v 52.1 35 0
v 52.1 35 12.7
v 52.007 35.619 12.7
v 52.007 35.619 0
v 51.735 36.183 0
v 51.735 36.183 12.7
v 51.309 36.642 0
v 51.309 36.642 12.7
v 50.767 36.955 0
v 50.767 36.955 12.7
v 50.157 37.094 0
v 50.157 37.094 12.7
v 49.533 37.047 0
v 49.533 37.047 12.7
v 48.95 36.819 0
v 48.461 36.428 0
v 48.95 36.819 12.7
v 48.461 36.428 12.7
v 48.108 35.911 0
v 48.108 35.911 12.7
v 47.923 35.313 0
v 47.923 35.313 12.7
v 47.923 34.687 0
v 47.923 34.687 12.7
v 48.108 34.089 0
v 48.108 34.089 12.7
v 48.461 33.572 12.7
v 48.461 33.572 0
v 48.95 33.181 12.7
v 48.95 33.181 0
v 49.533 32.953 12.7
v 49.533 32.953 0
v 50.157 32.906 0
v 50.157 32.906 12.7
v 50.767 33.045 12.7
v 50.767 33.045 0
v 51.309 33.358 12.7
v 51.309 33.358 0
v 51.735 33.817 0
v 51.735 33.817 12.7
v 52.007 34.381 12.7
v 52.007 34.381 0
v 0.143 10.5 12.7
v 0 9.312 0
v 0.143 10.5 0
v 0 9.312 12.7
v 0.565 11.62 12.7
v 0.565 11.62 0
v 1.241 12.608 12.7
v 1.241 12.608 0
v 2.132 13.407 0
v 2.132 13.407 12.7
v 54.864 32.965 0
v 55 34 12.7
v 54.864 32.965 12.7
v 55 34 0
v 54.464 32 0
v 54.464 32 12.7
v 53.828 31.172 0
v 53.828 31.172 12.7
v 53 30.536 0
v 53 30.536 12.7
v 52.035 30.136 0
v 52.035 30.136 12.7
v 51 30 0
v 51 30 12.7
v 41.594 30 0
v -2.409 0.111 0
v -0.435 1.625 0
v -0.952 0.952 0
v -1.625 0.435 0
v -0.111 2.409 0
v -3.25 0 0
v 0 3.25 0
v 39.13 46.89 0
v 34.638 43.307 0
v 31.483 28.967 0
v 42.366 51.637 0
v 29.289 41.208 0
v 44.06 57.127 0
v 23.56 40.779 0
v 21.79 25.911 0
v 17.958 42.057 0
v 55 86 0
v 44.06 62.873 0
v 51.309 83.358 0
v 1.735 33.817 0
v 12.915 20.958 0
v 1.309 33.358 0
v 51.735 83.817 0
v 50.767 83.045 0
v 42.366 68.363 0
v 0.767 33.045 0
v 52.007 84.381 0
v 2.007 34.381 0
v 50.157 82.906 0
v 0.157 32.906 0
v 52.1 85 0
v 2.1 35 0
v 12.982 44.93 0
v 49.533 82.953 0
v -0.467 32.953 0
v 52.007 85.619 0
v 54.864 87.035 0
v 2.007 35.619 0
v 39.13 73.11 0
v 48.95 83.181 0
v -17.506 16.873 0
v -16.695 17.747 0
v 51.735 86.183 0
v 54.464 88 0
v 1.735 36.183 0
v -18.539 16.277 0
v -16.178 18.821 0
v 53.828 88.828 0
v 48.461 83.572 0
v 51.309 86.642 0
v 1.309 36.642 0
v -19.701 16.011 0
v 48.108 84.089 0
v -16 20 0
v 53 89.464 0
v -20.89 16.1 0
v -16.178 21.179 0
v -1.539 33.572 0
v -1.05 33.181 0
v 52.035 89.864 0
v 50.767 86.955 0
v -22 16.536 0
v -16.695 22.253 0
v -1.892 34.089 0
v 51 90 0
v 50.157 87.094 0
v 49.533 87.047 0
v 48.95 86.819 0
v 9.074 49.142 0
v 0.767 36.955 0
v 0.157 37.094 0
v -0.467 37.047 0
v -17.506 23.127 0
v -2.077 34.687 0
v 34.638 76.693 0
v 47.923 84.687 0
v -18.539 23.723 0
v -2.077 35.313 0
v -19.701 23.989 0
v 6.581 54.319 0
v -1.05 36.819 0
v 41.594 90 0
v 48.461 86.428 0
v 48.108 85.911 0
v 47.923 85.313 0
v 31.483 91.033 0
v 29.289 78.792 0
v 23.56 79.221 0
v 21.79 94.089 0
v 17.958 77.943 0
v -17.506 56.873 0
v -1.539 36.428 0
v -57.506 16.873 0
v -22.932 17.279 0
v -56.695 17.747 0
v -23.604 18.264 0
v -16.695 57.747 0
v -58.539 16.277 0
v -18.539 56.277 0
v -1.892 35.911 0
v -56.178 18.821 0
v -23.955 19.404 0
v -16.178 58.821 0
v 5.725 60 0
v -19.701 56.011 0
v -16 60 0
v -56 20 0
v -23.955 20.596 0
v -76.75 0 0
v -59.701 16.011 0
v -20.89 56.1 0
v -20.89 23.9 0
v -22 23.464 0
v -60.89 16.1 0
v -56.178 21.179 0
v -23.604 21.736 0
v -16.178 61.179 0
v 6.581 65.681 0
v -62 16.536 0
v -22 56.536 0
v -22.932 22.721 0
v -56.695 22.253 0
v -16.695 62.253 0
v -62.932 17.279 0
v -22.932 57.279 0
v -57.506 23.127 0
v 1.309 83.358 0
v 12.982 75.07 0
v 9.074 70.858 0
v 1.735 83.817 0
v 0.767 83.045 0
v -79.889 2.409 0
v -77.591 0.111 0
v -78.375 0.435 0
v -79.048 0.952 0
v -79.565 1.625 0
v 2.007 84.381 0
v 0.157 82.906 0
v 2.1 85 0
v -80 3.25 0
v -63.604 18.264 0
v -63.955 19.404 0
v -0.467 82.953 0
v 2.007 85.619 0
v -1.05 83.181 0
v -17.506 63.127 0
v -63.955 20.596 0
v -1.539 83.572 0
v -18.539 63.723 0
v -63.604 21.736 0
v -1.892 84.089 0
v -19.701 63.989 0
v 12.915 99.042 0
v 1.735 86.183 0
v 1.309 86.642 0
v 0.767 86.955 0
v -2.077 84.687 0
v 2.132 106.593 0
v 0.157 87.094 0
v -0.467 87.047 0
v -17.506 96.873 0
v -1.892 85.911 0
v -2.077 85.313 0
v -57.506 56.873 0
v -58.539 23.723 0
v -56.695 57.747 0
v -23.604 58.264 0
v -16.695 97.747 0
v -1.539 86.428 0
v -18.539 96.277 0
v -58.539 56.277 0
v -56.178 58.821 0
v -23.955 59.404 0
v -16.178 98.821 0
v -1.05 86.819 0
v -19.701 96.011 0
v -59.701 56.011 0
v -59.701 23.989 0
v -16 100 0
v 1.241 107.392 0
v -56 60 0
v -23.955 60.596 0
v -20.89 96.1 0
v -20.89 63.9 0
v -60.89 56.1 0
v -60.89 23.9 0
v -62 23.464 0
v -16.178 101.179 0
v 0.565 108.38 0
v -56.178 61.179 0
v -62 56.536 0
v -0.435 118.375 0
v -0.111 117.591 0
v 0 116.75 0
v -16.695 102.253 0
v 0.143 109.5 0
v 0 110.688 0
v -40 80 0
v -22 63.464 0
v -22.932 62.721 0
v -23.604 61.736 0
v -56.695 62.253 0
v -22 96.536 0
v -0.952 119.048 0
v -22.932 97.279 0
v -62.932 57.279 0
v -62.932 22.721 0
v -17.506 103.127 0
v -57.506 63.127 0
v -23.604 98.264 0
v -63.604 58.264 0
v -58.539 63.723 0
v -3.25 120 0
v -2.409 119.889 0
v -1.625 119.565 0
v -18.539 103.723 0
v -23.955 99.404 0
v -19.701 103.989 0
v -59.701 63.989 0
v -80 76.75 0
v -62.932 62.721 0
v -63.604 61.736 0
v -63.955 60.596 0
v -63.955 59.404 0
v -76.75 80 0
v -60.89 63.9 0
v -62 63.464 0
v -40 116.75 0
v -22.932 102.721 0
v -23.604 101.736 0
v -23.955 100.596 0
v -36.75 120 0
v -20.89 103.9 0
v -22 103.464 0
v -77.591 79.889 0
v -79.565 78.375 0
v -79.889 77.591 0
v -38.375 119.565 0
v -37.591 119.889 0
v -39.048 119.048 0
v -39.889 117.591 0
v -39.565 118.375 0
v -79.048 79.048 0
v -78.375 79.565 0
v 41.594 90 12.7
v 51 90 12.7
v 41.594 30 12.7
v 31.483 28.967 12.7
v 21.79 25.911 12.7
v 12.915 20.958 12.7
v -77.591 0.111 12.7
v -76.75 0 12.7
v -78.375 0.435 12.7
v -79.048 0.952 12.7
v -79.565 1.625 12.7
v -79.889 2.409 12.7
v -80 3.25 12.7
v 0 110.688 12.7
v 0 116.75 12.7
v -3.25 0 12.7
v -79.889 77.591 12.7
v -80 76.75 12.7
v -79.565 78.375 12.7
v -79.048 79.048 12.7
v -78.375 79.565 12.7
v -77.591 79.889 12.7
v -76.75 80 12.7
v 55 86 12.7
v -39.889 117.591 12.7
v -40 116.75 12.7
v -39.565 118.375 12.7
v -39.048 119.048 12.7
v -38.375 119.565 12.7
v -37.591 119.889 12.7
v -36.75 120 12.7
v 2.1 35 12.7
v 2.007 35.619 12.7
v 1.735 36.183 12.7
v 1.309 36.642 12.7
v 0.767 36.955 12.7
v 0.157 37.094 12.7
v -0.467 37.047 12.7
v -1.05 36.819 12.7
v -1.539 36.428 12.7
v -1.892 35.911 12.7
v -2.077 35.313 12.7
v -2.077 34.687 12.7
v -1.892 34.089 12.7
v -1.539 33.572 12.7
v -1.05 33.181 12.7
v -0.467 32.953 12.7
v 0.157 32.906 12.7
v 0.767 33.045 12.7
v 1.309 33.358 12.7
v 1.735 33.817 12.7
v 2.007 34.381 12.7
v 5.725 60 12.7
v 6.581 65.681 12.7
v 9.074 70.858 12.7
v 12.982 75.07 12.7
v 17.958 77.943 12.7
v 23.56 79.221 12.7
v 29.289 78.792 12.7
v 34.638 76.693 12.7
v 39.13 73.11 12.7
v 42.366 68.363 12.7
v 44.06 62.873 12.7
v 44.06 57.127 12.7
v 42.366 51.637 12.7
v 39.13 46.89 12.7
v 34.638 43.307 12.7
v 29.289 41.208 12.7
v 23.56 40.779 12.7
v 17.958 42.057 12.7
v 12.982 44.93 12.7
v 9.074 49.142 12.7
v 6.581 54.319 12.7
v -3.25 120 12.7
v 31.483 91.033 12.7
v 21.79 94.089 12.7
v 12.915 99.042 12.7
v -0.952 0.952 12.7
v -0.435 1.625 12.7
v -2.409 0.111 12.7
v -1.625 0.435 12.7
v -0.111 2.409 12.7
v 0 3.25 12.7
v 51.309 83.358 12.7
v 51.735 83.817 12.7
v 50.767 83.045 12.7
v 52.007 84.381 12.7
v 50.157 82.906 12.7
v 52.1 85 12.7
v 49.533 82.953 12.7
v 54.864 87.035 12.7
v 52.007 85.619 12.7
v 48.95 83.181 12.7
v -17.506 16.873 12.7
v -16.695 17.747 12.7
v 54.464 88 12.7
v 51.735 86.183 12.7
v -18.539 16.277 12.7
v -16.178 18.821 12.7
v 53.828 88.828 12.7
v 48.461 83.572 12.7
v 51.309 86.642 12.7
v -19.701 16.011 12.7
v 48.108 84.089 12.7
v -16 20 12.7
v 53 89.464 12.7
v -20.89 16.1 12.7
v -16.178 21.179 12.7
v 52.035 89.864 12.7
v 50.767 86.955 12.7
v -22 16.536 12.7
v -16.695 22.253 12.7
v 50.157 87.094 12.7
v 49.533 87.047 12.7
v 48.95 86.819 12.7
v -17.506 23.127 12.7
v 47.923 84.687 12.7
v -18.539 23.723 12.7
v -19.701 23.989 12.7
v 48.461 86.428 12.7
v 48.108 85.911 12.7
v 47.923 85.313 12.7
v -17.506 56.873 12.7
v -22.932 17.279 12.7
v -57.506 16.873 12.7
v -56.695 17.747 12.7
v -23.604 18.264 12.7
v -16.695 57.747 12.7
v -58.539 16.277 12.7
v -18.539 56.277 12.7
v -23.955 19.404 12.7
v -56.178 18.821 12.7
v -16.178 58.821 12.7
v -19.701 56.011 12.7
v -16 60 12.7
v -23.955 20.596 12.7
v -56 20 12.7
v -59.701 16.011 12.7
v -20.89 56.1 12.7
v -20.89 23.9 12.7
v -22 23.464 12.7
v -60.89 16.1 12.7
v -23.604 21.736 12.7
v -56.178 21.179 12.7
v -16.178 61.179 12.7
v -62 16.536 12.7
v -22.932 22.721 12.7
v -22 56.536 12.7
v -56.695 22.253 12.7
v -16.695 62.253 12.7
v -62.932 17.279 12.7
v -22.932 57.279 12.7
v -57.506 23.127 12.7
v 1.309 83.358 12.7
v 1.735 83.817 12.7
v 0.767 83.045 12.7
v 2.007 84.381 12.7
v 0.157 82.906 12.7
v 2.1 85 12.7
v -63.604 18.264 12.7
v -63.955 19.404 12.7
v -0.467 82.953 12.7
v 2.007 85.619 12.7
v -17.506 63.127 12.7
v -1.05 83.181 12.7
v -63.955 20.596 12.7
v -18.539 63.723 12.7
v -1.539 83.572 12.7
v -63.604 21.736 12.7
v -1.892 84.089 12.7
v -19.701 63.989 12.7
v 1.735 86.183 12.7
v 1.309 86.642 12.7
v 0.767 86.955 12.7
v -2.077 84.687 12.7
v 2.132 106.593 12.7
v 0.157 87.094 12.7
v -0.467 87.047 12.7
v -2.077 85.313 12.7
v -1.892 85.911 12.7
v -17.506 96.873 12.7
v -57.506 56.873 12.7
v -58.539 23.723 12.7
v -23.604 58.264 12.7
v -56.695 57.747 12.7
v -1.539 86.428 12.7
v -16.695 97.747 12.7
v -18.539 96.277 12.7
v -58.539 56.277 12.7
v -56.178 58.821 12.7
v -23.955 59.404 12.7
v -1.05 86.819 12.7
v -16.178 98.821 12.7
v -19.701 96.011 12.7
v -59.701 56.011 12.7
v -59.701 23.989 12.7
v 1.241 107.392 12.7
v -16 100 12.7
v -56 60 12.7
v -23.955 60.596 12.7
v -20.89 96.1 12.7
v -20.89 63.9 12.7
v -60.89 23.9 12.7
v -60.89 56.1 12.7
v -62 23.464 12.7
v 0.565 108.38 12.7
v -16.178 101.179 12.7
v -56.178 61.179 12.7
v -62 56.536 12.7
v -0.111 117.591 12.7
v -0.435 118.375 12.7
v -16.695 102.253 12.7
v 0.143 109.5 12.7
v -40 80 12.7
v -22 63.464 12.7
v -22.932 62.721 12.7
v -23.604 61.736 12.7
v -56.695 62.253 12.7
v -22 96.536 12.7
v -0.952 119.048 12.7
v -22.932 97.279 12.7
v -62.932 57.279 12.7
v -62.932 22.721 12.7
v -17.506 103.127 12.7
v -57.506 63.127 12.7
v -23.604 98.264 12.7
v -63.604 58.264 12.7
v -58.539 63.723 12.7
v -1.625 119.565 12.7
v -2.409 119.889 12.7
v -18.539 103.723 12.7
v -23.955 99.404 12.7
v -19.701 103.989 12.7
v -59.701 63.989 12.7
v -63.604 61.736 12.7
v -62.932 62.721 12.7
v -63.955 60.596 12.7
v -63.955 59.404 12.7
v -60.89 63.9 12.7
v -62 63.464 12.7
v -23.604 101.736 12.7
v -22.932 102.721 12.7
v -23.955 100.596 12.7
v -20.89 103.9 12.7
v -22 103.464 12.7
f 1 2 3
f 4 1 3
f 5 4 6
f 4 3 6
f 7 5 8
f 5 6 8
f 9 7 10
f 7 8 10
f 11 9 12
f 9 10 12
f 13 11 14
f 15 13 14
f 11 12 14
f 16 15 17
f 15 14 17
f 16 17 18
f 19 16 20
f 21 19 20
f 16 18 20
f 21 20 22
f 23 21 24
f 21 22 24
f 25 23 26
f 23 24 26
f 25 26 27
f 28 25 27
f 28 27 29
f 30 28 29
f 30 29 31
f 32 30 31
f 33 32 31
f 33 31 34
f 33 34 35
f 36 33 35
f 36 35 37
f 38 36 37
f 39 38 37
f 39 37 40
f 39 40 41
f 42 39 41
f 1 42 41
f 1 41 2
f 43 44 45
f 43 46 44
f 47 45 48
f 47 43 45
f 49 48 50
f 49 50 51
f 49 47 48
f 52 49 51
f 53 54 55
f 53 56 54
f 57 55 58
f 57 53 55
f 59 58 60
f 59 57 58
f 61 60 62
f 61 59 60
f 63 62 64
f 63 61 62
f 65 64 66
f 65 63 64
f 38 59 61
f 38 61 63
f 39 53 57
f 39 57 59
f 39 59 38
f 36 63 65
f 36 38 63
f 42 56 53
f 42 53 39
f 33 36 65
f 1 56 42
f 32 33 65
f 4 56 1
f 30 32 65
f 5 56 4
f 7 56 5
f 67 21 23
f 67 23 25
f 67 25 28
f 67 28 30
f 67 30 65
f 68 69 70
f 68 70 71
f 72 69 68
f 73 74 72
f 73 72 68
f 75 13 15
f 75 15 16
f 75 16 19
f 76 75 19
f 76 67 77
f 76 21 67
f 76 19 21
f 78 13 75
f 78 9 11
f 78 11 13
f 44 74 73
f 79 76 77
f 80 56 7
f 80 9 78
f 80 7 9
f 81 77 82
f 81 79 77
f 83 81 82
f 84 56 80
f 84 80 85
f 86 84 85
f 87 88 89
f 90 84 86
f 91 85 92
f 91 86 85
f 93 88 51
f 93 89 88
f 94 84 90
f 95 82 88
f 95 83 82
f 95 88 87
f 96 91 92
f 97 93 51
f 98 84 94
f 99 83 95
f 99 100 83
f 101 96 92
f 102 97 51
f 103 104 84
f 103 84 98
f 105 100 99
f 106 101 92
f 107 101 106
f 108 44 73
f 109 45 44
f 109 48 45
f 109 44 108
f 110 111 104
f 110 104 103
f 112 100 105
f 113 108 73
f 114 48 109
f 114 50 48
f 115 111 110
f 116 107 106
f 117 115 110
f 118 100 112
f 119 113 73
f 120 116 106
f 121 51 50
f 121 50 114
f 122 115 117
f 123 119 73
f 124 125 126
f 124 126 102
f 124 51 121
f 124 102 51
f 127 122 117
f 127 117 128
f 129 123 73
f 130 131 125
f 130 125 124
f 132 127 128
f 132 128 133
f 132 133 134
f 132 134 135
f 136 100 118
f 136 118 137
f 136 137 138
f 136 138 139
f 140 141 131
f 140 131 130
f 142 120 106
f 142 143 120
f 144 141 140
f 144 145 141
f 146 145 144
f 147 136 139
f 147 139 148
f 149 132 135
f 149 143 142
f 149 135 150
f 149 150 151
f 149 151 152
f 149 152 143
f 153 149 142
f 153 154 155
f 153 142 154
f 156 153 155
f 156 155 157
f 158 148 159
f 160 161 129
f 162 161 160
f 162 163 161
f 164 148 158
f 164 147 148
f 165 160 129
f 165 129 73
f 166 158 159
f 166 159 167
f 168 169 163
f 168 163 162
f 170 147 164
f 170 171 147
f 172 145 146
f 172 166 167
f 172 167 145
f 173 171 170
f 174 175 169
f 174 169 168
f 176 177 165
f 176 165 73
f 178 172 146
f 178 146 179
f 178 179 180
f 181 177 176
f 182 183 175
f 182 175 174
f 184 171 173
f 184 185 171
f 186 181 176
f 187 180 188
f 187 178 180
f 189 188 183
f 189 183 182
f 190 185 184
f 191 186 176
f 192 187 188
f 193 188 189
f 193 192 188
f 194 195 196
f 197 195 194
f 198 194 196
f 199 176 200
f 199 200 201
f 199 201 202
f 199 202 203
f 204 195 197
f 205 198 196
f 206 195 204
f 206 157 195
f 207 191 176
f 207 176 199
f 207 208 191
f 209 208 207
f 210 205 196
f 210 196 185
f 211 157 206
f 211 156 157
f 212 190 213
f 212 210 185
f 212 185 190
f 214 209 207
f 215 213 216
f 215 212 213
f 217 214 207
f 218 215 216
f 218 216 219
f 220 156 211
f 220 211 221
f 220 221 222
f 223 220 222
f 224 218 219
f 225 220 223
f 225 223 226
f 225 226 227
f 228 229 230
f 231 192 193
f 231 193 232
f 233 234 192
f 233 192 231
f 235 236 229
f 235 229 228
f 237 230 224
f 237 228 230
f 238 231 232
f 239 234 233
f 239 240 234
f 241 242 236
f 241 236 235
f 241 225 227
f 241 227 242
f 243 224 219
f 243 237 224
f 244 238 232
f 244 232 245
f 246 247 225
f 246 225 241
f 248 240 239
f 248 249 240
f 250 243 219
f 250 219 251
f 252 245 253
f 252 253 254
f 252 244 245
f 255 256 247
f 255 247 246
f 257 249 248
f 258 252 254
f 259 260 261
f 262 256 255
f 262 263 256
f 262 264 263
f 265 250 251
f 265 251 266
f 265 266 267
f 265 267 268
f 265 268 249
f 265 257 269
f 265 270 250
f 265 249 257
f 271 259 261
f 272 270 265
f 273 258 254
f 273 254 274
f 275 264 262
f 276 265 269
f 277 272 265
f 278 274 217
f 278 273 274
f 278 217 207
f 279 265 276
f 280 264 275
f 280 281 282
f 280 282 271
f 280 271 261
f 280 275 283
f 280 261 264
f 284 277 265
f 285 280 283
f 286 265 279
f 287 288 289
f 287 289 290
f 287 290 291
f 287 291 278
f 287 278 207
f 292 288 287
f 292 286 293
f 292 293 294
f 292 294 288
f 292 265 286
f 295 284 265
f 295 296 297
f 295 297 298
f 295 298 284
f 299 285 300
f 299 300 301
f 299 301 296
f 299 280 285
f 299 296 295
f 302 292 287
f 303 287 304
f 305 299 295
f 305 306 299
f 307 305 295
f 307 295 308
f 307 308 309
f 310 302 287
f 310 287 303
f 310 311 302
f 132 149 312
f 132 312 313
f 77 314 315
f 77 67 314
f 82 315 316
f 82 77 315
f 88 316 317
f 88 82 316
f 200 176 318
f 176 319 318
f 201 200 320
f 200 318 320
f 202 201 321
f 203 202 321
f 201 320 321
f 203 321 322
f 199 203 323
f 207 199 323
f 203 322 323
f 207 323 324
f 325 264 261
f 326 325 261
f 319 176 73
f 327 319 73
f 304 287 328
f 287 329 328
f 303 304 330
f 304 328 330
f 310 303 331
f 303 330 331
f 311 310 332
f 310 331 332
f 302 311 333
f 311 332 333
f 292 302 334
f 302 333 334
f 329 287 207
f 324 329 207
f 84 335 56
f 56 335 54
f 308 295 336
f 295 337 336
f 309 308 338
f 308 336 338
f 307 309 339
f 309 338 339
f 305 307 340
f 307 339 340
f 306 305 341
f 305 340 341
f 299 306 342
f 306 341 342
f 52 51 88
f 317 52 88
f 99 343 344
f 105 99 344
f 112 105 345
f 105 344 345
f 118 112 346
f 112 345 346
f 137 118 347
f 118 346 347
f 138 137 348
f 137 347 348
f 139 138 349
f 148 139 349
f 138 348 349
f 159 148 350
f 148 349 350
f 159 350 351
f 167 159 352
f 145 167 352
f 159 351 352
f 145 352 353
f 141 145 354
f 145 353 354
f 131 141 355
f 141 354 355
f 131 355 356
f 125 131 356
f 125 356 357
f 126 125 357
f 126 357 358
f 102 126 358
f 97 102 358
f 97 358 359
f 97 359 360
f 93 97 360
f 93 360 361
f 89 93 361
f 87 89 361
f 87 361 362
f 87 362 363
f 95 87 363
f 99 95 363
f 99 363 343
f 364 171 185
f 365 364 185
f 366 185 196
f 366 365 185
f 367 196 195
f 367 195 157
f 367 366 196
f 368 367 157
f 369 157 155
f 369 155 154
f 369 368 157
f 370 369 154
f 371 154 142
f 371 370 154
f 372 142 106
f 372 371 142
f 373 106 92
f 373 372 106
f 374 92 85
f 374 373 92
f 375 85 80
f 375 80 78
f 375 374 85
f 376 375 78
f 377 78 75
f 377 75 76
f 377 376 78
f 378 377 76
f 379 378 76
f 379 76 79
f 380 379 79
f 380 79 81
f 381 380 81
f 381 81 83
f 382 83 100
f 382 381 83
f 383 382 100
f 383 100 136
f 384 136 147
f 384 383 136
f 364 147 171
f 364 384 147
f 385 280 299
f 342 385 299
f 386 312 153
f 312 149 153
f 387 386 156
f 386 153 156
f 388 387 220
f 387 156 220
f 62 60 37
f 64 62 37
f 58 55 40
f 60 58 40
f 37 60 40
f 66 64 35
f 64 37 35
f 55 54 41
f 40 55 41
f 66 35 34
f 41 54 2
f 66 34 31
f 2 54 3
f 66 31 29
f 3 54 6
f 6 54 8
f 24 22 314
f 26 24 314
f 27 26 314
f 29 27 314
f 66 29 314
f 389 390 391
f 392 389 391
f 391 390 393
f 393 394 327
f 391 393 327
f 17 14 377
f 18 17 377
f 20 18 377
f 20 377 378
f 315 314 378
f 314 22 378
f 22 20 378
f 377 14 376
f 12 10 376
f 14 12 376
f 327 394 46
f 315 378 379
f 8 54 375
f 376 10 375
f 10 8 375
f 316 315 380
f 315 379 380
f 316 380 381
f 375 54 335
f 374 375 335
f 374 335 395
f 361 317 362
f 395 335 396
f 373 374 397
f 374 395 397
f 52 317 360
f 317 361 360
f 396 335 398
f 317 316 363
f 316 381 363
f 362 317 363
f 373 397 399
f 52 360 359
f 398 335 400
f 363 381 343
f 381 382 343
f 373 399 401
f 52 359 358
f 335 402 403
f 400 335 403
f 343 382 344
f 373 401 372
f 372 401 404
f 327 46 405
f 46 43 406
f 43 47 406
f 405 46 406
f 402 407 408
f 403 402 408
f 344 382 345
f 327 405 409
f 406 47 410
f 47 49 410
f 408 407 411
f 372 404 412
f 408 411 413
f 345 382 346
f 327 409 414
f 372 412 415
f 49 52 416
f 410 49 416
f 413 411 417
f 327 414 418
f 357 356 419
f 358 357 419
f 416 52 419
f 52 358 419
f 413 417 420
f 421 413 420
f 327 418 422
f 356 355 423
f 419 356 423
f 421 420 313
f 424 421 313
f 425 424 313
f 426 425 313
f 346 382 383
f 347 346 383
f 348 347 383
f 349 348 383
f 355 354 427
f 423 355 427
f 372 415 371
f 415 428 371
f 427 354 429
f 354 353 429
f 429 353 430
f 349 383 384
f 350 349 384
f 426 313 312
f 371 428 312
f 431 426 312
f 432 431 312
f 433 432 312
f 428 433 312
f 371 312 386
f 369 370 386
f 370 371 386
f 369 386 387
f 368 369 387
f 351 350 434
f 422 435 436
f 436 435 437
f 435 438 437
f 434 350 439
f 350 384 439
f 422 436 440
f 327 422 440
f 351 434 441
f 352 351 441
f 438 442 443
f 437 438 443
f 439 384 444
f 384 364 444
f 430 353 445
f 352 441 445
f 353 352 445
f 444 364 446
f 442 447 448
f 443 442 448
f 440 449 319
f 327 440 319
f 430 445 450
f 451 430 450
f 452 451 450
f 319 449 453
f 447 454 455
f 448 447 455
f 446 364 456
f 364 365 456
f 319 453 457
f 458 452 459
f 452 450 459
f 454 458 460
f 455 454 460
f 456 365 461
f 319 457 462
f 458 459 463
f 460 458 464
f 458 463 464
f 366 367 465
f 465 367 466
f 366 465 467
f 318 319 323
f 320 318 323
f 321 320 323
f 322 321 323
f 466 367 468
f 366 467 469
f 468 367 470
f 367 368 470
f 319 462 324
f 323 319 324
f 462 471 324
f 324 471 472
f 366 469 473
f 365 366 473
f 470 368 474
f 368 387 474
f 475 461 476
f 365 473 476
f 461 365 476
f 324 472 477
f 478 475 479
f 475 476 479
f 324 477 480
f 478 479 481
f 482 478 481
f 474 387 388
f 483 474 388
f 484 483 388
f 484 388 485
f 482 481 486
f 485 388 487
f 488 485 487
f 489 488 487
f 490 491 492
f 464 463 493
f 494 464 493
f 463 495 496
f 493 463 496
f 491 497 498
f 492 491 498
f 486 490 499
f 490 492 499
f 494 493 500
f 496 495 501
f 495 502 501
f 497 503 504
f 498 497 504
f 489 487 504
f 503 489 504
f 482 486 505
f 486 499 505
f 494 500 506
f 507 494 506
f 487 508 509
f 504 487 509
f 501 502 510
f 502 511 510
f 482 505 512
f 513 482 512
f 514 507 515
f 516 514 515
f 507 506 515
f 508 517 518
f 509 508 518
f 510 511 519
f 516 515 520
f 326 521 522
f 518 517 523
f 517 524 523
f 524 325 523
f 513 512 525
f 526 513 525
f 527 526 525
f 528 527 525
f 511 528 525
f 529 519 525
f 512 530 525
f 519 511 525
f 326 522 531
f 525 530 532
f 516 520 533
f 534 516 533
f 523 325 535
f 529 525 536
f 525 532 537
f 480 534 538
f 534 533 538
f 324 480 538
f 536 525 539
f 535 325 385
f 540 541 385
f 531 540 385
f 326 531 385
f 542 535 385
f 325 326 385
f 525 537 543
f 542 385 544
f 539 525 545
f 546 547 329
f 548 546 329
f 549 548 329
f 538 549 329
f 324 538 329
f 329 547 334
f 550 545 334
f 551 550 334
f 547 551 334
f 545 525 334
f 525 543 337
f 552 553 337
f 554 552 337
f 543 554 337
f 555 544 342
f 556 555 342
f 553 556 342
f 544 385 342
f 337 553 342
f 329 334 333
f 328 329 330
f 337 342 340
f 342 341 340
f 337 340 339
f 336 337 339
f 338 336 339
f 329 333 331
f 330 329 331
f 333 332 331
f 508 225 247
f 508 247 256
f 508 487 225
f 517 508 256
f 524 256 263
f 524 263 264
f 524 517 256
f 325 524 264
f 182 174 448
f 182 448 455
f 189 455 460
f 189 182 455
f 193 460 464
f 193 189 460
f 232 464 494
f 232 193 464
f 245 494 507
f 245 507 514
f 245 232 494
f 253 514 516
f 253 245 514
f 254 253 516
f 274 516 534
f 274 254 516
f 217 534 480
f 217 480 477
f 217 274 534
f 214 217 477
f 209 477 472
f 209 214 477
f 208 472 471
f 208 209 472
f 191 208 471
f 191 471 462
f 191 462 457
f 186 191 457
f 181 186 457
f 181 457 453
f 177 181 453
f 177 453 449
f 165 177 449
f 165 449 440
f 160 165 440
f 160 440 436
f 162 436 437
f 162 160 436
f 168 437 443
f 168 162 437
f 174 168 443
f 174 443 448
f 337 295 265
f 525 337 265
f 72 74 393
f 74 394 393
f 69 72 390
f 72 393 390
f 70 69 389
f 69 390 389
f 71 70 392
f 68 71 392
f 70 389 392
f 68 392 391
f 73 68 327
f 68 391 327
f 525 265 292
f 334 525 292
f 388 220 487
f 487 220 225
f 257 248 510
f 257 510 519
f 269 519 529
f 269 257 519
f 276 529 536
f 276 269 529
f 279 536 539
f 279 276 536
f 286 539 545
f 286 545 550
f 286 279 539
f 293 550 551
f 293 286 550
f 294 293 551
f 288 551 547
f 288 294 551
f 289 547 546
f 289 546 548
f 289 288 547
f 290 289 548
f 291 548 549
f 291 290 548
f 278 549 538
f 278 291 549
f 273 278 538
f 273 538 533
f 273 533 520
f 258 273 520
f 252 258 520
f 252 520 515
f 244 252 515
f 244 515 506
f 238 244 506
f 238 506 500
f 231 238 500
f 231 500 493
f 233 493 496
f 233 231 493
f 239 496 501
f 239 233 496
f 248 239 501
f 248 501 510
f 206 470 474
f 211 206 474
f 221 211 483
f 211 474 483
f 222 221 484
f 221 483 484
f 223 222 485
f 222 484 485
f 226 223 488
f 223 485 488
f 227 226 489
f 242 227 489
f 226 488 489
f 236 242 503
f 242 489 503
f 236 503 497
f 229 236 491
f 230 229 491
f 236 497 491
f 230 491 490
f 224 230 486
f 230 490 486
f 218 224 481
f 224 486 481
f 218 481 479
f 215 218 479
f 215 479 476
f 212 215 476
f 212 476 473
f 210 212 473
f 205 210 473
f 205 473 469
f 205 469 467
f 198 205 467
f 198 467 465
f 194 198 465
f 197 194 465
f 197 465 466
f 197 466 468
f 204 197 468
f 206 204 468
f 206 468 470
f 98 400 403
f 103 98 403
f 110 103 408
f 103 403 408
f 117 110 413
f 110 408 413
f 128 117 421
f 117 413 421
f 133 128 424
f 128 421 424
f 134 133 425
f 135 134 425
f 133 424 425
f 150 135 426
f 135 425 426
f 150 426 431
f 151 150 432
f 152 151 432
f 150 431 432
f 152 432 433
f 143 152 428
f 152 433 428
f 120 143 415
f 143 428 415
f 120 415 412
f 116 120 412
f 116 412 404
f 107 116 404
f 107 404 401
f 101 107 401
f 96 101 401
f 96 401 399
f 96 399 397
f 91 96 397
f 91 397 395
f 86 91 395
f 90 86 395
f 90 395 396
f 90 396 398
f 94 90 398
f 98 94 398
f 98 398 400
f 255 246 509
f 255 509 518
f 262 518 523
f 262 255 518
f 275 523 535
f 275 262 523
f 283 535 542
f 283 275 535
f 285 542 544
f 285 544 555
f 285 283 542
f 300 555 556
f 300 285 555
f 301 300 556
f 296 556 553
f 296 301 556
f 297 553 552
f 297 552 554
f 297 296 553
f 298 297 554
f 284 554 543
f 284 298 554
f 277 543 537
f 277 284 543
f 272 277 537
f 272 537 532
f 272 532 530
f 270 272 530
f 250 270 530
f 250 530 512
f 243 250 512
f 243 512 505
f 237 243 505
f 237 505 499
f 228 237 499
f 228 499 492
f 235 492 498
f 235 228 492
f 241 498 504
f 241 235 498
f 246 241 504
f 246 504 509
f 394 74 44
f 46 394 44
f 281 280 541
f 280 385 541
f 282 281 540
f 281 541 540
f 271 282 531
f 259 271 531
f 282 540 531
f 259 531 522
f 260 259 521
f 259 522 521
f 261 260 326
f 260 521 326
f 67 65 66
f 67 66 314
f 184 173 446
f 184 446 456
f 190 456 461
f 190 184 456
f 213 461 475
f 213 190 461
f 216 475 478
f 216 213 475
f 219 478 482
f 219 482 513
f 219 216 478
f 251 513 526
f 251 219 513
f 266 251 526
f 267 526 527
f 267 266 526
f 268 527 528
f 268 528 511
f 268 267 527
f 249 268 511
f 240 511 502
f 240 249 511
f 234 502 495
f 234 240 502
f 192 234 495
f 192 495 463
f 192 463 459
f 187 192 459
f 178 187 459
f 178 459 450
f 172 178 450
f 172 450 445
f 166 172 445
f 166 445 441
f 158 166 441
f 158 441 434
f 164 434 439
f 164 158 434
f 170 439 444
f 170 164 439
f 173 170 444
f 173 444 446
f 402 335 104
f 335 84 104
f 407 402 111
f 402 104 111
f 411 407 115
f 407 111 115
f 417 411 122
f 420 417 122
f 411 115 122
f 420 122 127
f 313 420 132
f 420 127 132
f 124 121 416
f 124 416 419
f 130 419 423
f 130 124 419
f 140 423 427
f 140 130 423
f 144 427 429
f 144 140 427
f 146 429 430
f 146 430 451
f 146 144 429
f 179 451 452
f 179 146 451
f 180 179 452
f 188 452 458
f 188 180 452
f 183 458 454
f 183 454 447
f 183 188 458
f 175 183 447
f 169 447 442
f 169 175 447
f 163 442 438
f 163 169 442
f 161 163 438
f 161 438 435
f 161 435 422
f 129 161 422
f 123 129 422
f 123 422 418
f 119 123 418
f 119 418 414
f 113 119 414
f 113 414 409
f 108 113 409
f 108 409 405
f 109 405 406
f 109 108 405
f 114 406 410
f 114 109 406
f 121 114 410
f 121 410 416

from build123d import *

# Parameters (mm, degrees)
SKETCH1_R                = 4
SKETCH1_R_2              = 13.05
BOSS_EXTRUDE1_DEPTH      = 12.7
BOSS_EXTRUDE2_START      = -3.2
SKETCH2_R                = 13.05
SKETCH2_R_2              = 10
BOSS_EXTRUDE2_DEPTH      = 3.2
FILLET1_R                = 5
FILLET2_R                = 3.25
BOSS_EXTRUDE3_START      = -12.7
BOSS_EXTRUDE3_DEPTH      = 12.7
CUT_EXTRUDE1_START       = -12.7
CUT_EXTRUDE1_OUTLINE_R   = 19.275
CUT_EXTRUDE1_OUTLINE_R_2 = 10
CUT_EXTRUDE1_DEPTH       = 12.7
FILLET3_R                = 4
FILLET4_R                = 50
M5X0_8_TAPPED_HOLE1_D    = 4.2


# Read off the part's stored shape, not the designer's step: Boss-Extrude3, Cut-Extrude1
with BuildPart() as part:
    # Sketch1 → Boss-Extrude1 (new body)
    with BuildSketch(Plane.XY):
        with BuildLine():
            Line((0, 0), (0, 11.914408096))
            Line((0, 11.914408096), (39.368089731, 39.480241291))
            ThreePointArc((39.368089731, 39.480241291), (50.05, 60), (39.368089731, 80.519758709))
            Line((39.368089731, 80.519758709), (0, 108.085591904))
            Line((0, 108.085591904), (0, 120))
            Line((0, 120), (-40, 120))
            Line((-40, 120), (-40, 80))
            Line((-40, 80), (-80, 80))
            Line((-80, 80), (-80, 0))
            Line((-80, 0), (0, 0))
        make_face()
        with Locations((-20, 20)):
            Circle(SKETCH1_R, mode=Mode.SUBTRACT)
        with Locations((-60, 20)):
            Circle(SKETCH1_R, mode=Mode.SUBTRACT)
        with Locations((-60, 60)):
            Circle(SKETCH1_R, mode=Mode.SUBTRACT)
        with Locations((-20, 60)):
            Circle(SKETCH1_R, mode=Mode.SUBTRACT)
        with Locations((-20, 100)):
            Circle(SKETCH1_R, mode=Mode.SUBTRACT)
        with Locations((25, 60)):
            Circle(SKETCH1_R_2, mode=Mode.SUBTRACT)
    extrude(amount=BOSS_EXTRUDE1_DEPTH)

    # Sketch2 → Boss-Extrude2 (add)
    with BuildSketch(Plane.XY.offset(12.7).offset(BOSS_EXTRUDE2_START)):
        with Locations((25, 60)):
            Circle(SKETCH2_R)
        with Locations((25, 60)):
            Circle(SKETCH2_R_2, mode=Mode.SUBTRACT)
    extrude(amount=BOSS_EXTRUDE2_DEPTH)

    # Fillet1
    fillet1_edges = [part.edges().sort_by_distance(p)[0] for p in [
        (0, 108.085591904, 6.35),
        (0, 11.914408096, 6.35),
    ]]
    fillet(fillet1_edges, radius=FILLET1_R)

    # Fillet2
    fillet2_edges = [part.edges().sort_by_distance(p)[0] for p in [
        (-80, 0, 6.35),
        (-80, 80, 6.35),
        (-40, 120, 6.35),
        (0, 120, 6.35),
        (0, 0, 6.35),
    ]]
    fillet(fillet2_edges, radius=FILLET2_R)

    # Boss-Extrude3 outline → Boss-Extrude3 (add)
    with BuildSketch(Plane(origin=(0, 0, 0), x_dir=(-1, 0, 0), z_dir=(0, 0, -1)).offset(BOSS_EXTRUDE3_START)):
        with BuildLine():
            Line((-55, 90), (-55, 30))
            Line((-55, 30), (-25.828902028, 30))
            Line((-25.828902028, 30), (-39.368089731, 39.480241291))
            ThreePointArc((-39.368089731, 39.480241291), (-50.05, 60), (-39.368089731, 80.519758709))
            Line((-39.368089731, 80.519758709), (-25.828902028, 90))
            Line((-25.828902028, 90), (-55, 90))
        make_face()
    extrude(amount=BOSS_EXTRUDE3_DEPTH)

    # Cut-Extrude1 outline → Cut-Extrude1 (cut)
    with BuildSketch(Plane(origin=(0, 0, 0), x_dir=(-1, 0, 0), z_dir=(0, 0, -1)).offset(CUT_EXTRUDE1_START)):
        with Locations((-25, 60)):
            Circle(CUT_EXTRUDE1_OUTLINE_R)
        with Locations((-25, 60)):
            Circle(CUT_EXTRUDE1_OUTLINE_R_2, mode=Mode.SUBTRACT)
    extrude(amount=CUT_EXTRUDE1_DEPTH, mode=Mode.SUBTRACT)

    # Fillet3
    fillet3_edges = [part.edges().sort_by_distance(p)[0] for p in [
        (55, 90, 6.35),
        (55, 30, 6.35),
    ]]
    fillet(fillet3_edges, radius=FILLET3_R)

    # Fillet4
    fillet4_edges = [part.edges().sort_by_distance(p)[0] for p in [
        (25.828902028, 30, 6.35),
        (25.828902028, 90, 6.35),
    ]]
    fillet(fillet4_edges, radius=FILLET4_R)

    # M5x0.8 Tapped Hole1 (through all)
    with Locations(Plane(origin=(0, 0, 0), x_dir=(-1, 0, 0), z_dir=(0, 0, -1))):
        with Locations((0, 85), (0, 35), (-50, 85), (-50, 35)):
            Hole(M5X0_8_TAPPED_HOLE1_D / 2)


solid = part.part
